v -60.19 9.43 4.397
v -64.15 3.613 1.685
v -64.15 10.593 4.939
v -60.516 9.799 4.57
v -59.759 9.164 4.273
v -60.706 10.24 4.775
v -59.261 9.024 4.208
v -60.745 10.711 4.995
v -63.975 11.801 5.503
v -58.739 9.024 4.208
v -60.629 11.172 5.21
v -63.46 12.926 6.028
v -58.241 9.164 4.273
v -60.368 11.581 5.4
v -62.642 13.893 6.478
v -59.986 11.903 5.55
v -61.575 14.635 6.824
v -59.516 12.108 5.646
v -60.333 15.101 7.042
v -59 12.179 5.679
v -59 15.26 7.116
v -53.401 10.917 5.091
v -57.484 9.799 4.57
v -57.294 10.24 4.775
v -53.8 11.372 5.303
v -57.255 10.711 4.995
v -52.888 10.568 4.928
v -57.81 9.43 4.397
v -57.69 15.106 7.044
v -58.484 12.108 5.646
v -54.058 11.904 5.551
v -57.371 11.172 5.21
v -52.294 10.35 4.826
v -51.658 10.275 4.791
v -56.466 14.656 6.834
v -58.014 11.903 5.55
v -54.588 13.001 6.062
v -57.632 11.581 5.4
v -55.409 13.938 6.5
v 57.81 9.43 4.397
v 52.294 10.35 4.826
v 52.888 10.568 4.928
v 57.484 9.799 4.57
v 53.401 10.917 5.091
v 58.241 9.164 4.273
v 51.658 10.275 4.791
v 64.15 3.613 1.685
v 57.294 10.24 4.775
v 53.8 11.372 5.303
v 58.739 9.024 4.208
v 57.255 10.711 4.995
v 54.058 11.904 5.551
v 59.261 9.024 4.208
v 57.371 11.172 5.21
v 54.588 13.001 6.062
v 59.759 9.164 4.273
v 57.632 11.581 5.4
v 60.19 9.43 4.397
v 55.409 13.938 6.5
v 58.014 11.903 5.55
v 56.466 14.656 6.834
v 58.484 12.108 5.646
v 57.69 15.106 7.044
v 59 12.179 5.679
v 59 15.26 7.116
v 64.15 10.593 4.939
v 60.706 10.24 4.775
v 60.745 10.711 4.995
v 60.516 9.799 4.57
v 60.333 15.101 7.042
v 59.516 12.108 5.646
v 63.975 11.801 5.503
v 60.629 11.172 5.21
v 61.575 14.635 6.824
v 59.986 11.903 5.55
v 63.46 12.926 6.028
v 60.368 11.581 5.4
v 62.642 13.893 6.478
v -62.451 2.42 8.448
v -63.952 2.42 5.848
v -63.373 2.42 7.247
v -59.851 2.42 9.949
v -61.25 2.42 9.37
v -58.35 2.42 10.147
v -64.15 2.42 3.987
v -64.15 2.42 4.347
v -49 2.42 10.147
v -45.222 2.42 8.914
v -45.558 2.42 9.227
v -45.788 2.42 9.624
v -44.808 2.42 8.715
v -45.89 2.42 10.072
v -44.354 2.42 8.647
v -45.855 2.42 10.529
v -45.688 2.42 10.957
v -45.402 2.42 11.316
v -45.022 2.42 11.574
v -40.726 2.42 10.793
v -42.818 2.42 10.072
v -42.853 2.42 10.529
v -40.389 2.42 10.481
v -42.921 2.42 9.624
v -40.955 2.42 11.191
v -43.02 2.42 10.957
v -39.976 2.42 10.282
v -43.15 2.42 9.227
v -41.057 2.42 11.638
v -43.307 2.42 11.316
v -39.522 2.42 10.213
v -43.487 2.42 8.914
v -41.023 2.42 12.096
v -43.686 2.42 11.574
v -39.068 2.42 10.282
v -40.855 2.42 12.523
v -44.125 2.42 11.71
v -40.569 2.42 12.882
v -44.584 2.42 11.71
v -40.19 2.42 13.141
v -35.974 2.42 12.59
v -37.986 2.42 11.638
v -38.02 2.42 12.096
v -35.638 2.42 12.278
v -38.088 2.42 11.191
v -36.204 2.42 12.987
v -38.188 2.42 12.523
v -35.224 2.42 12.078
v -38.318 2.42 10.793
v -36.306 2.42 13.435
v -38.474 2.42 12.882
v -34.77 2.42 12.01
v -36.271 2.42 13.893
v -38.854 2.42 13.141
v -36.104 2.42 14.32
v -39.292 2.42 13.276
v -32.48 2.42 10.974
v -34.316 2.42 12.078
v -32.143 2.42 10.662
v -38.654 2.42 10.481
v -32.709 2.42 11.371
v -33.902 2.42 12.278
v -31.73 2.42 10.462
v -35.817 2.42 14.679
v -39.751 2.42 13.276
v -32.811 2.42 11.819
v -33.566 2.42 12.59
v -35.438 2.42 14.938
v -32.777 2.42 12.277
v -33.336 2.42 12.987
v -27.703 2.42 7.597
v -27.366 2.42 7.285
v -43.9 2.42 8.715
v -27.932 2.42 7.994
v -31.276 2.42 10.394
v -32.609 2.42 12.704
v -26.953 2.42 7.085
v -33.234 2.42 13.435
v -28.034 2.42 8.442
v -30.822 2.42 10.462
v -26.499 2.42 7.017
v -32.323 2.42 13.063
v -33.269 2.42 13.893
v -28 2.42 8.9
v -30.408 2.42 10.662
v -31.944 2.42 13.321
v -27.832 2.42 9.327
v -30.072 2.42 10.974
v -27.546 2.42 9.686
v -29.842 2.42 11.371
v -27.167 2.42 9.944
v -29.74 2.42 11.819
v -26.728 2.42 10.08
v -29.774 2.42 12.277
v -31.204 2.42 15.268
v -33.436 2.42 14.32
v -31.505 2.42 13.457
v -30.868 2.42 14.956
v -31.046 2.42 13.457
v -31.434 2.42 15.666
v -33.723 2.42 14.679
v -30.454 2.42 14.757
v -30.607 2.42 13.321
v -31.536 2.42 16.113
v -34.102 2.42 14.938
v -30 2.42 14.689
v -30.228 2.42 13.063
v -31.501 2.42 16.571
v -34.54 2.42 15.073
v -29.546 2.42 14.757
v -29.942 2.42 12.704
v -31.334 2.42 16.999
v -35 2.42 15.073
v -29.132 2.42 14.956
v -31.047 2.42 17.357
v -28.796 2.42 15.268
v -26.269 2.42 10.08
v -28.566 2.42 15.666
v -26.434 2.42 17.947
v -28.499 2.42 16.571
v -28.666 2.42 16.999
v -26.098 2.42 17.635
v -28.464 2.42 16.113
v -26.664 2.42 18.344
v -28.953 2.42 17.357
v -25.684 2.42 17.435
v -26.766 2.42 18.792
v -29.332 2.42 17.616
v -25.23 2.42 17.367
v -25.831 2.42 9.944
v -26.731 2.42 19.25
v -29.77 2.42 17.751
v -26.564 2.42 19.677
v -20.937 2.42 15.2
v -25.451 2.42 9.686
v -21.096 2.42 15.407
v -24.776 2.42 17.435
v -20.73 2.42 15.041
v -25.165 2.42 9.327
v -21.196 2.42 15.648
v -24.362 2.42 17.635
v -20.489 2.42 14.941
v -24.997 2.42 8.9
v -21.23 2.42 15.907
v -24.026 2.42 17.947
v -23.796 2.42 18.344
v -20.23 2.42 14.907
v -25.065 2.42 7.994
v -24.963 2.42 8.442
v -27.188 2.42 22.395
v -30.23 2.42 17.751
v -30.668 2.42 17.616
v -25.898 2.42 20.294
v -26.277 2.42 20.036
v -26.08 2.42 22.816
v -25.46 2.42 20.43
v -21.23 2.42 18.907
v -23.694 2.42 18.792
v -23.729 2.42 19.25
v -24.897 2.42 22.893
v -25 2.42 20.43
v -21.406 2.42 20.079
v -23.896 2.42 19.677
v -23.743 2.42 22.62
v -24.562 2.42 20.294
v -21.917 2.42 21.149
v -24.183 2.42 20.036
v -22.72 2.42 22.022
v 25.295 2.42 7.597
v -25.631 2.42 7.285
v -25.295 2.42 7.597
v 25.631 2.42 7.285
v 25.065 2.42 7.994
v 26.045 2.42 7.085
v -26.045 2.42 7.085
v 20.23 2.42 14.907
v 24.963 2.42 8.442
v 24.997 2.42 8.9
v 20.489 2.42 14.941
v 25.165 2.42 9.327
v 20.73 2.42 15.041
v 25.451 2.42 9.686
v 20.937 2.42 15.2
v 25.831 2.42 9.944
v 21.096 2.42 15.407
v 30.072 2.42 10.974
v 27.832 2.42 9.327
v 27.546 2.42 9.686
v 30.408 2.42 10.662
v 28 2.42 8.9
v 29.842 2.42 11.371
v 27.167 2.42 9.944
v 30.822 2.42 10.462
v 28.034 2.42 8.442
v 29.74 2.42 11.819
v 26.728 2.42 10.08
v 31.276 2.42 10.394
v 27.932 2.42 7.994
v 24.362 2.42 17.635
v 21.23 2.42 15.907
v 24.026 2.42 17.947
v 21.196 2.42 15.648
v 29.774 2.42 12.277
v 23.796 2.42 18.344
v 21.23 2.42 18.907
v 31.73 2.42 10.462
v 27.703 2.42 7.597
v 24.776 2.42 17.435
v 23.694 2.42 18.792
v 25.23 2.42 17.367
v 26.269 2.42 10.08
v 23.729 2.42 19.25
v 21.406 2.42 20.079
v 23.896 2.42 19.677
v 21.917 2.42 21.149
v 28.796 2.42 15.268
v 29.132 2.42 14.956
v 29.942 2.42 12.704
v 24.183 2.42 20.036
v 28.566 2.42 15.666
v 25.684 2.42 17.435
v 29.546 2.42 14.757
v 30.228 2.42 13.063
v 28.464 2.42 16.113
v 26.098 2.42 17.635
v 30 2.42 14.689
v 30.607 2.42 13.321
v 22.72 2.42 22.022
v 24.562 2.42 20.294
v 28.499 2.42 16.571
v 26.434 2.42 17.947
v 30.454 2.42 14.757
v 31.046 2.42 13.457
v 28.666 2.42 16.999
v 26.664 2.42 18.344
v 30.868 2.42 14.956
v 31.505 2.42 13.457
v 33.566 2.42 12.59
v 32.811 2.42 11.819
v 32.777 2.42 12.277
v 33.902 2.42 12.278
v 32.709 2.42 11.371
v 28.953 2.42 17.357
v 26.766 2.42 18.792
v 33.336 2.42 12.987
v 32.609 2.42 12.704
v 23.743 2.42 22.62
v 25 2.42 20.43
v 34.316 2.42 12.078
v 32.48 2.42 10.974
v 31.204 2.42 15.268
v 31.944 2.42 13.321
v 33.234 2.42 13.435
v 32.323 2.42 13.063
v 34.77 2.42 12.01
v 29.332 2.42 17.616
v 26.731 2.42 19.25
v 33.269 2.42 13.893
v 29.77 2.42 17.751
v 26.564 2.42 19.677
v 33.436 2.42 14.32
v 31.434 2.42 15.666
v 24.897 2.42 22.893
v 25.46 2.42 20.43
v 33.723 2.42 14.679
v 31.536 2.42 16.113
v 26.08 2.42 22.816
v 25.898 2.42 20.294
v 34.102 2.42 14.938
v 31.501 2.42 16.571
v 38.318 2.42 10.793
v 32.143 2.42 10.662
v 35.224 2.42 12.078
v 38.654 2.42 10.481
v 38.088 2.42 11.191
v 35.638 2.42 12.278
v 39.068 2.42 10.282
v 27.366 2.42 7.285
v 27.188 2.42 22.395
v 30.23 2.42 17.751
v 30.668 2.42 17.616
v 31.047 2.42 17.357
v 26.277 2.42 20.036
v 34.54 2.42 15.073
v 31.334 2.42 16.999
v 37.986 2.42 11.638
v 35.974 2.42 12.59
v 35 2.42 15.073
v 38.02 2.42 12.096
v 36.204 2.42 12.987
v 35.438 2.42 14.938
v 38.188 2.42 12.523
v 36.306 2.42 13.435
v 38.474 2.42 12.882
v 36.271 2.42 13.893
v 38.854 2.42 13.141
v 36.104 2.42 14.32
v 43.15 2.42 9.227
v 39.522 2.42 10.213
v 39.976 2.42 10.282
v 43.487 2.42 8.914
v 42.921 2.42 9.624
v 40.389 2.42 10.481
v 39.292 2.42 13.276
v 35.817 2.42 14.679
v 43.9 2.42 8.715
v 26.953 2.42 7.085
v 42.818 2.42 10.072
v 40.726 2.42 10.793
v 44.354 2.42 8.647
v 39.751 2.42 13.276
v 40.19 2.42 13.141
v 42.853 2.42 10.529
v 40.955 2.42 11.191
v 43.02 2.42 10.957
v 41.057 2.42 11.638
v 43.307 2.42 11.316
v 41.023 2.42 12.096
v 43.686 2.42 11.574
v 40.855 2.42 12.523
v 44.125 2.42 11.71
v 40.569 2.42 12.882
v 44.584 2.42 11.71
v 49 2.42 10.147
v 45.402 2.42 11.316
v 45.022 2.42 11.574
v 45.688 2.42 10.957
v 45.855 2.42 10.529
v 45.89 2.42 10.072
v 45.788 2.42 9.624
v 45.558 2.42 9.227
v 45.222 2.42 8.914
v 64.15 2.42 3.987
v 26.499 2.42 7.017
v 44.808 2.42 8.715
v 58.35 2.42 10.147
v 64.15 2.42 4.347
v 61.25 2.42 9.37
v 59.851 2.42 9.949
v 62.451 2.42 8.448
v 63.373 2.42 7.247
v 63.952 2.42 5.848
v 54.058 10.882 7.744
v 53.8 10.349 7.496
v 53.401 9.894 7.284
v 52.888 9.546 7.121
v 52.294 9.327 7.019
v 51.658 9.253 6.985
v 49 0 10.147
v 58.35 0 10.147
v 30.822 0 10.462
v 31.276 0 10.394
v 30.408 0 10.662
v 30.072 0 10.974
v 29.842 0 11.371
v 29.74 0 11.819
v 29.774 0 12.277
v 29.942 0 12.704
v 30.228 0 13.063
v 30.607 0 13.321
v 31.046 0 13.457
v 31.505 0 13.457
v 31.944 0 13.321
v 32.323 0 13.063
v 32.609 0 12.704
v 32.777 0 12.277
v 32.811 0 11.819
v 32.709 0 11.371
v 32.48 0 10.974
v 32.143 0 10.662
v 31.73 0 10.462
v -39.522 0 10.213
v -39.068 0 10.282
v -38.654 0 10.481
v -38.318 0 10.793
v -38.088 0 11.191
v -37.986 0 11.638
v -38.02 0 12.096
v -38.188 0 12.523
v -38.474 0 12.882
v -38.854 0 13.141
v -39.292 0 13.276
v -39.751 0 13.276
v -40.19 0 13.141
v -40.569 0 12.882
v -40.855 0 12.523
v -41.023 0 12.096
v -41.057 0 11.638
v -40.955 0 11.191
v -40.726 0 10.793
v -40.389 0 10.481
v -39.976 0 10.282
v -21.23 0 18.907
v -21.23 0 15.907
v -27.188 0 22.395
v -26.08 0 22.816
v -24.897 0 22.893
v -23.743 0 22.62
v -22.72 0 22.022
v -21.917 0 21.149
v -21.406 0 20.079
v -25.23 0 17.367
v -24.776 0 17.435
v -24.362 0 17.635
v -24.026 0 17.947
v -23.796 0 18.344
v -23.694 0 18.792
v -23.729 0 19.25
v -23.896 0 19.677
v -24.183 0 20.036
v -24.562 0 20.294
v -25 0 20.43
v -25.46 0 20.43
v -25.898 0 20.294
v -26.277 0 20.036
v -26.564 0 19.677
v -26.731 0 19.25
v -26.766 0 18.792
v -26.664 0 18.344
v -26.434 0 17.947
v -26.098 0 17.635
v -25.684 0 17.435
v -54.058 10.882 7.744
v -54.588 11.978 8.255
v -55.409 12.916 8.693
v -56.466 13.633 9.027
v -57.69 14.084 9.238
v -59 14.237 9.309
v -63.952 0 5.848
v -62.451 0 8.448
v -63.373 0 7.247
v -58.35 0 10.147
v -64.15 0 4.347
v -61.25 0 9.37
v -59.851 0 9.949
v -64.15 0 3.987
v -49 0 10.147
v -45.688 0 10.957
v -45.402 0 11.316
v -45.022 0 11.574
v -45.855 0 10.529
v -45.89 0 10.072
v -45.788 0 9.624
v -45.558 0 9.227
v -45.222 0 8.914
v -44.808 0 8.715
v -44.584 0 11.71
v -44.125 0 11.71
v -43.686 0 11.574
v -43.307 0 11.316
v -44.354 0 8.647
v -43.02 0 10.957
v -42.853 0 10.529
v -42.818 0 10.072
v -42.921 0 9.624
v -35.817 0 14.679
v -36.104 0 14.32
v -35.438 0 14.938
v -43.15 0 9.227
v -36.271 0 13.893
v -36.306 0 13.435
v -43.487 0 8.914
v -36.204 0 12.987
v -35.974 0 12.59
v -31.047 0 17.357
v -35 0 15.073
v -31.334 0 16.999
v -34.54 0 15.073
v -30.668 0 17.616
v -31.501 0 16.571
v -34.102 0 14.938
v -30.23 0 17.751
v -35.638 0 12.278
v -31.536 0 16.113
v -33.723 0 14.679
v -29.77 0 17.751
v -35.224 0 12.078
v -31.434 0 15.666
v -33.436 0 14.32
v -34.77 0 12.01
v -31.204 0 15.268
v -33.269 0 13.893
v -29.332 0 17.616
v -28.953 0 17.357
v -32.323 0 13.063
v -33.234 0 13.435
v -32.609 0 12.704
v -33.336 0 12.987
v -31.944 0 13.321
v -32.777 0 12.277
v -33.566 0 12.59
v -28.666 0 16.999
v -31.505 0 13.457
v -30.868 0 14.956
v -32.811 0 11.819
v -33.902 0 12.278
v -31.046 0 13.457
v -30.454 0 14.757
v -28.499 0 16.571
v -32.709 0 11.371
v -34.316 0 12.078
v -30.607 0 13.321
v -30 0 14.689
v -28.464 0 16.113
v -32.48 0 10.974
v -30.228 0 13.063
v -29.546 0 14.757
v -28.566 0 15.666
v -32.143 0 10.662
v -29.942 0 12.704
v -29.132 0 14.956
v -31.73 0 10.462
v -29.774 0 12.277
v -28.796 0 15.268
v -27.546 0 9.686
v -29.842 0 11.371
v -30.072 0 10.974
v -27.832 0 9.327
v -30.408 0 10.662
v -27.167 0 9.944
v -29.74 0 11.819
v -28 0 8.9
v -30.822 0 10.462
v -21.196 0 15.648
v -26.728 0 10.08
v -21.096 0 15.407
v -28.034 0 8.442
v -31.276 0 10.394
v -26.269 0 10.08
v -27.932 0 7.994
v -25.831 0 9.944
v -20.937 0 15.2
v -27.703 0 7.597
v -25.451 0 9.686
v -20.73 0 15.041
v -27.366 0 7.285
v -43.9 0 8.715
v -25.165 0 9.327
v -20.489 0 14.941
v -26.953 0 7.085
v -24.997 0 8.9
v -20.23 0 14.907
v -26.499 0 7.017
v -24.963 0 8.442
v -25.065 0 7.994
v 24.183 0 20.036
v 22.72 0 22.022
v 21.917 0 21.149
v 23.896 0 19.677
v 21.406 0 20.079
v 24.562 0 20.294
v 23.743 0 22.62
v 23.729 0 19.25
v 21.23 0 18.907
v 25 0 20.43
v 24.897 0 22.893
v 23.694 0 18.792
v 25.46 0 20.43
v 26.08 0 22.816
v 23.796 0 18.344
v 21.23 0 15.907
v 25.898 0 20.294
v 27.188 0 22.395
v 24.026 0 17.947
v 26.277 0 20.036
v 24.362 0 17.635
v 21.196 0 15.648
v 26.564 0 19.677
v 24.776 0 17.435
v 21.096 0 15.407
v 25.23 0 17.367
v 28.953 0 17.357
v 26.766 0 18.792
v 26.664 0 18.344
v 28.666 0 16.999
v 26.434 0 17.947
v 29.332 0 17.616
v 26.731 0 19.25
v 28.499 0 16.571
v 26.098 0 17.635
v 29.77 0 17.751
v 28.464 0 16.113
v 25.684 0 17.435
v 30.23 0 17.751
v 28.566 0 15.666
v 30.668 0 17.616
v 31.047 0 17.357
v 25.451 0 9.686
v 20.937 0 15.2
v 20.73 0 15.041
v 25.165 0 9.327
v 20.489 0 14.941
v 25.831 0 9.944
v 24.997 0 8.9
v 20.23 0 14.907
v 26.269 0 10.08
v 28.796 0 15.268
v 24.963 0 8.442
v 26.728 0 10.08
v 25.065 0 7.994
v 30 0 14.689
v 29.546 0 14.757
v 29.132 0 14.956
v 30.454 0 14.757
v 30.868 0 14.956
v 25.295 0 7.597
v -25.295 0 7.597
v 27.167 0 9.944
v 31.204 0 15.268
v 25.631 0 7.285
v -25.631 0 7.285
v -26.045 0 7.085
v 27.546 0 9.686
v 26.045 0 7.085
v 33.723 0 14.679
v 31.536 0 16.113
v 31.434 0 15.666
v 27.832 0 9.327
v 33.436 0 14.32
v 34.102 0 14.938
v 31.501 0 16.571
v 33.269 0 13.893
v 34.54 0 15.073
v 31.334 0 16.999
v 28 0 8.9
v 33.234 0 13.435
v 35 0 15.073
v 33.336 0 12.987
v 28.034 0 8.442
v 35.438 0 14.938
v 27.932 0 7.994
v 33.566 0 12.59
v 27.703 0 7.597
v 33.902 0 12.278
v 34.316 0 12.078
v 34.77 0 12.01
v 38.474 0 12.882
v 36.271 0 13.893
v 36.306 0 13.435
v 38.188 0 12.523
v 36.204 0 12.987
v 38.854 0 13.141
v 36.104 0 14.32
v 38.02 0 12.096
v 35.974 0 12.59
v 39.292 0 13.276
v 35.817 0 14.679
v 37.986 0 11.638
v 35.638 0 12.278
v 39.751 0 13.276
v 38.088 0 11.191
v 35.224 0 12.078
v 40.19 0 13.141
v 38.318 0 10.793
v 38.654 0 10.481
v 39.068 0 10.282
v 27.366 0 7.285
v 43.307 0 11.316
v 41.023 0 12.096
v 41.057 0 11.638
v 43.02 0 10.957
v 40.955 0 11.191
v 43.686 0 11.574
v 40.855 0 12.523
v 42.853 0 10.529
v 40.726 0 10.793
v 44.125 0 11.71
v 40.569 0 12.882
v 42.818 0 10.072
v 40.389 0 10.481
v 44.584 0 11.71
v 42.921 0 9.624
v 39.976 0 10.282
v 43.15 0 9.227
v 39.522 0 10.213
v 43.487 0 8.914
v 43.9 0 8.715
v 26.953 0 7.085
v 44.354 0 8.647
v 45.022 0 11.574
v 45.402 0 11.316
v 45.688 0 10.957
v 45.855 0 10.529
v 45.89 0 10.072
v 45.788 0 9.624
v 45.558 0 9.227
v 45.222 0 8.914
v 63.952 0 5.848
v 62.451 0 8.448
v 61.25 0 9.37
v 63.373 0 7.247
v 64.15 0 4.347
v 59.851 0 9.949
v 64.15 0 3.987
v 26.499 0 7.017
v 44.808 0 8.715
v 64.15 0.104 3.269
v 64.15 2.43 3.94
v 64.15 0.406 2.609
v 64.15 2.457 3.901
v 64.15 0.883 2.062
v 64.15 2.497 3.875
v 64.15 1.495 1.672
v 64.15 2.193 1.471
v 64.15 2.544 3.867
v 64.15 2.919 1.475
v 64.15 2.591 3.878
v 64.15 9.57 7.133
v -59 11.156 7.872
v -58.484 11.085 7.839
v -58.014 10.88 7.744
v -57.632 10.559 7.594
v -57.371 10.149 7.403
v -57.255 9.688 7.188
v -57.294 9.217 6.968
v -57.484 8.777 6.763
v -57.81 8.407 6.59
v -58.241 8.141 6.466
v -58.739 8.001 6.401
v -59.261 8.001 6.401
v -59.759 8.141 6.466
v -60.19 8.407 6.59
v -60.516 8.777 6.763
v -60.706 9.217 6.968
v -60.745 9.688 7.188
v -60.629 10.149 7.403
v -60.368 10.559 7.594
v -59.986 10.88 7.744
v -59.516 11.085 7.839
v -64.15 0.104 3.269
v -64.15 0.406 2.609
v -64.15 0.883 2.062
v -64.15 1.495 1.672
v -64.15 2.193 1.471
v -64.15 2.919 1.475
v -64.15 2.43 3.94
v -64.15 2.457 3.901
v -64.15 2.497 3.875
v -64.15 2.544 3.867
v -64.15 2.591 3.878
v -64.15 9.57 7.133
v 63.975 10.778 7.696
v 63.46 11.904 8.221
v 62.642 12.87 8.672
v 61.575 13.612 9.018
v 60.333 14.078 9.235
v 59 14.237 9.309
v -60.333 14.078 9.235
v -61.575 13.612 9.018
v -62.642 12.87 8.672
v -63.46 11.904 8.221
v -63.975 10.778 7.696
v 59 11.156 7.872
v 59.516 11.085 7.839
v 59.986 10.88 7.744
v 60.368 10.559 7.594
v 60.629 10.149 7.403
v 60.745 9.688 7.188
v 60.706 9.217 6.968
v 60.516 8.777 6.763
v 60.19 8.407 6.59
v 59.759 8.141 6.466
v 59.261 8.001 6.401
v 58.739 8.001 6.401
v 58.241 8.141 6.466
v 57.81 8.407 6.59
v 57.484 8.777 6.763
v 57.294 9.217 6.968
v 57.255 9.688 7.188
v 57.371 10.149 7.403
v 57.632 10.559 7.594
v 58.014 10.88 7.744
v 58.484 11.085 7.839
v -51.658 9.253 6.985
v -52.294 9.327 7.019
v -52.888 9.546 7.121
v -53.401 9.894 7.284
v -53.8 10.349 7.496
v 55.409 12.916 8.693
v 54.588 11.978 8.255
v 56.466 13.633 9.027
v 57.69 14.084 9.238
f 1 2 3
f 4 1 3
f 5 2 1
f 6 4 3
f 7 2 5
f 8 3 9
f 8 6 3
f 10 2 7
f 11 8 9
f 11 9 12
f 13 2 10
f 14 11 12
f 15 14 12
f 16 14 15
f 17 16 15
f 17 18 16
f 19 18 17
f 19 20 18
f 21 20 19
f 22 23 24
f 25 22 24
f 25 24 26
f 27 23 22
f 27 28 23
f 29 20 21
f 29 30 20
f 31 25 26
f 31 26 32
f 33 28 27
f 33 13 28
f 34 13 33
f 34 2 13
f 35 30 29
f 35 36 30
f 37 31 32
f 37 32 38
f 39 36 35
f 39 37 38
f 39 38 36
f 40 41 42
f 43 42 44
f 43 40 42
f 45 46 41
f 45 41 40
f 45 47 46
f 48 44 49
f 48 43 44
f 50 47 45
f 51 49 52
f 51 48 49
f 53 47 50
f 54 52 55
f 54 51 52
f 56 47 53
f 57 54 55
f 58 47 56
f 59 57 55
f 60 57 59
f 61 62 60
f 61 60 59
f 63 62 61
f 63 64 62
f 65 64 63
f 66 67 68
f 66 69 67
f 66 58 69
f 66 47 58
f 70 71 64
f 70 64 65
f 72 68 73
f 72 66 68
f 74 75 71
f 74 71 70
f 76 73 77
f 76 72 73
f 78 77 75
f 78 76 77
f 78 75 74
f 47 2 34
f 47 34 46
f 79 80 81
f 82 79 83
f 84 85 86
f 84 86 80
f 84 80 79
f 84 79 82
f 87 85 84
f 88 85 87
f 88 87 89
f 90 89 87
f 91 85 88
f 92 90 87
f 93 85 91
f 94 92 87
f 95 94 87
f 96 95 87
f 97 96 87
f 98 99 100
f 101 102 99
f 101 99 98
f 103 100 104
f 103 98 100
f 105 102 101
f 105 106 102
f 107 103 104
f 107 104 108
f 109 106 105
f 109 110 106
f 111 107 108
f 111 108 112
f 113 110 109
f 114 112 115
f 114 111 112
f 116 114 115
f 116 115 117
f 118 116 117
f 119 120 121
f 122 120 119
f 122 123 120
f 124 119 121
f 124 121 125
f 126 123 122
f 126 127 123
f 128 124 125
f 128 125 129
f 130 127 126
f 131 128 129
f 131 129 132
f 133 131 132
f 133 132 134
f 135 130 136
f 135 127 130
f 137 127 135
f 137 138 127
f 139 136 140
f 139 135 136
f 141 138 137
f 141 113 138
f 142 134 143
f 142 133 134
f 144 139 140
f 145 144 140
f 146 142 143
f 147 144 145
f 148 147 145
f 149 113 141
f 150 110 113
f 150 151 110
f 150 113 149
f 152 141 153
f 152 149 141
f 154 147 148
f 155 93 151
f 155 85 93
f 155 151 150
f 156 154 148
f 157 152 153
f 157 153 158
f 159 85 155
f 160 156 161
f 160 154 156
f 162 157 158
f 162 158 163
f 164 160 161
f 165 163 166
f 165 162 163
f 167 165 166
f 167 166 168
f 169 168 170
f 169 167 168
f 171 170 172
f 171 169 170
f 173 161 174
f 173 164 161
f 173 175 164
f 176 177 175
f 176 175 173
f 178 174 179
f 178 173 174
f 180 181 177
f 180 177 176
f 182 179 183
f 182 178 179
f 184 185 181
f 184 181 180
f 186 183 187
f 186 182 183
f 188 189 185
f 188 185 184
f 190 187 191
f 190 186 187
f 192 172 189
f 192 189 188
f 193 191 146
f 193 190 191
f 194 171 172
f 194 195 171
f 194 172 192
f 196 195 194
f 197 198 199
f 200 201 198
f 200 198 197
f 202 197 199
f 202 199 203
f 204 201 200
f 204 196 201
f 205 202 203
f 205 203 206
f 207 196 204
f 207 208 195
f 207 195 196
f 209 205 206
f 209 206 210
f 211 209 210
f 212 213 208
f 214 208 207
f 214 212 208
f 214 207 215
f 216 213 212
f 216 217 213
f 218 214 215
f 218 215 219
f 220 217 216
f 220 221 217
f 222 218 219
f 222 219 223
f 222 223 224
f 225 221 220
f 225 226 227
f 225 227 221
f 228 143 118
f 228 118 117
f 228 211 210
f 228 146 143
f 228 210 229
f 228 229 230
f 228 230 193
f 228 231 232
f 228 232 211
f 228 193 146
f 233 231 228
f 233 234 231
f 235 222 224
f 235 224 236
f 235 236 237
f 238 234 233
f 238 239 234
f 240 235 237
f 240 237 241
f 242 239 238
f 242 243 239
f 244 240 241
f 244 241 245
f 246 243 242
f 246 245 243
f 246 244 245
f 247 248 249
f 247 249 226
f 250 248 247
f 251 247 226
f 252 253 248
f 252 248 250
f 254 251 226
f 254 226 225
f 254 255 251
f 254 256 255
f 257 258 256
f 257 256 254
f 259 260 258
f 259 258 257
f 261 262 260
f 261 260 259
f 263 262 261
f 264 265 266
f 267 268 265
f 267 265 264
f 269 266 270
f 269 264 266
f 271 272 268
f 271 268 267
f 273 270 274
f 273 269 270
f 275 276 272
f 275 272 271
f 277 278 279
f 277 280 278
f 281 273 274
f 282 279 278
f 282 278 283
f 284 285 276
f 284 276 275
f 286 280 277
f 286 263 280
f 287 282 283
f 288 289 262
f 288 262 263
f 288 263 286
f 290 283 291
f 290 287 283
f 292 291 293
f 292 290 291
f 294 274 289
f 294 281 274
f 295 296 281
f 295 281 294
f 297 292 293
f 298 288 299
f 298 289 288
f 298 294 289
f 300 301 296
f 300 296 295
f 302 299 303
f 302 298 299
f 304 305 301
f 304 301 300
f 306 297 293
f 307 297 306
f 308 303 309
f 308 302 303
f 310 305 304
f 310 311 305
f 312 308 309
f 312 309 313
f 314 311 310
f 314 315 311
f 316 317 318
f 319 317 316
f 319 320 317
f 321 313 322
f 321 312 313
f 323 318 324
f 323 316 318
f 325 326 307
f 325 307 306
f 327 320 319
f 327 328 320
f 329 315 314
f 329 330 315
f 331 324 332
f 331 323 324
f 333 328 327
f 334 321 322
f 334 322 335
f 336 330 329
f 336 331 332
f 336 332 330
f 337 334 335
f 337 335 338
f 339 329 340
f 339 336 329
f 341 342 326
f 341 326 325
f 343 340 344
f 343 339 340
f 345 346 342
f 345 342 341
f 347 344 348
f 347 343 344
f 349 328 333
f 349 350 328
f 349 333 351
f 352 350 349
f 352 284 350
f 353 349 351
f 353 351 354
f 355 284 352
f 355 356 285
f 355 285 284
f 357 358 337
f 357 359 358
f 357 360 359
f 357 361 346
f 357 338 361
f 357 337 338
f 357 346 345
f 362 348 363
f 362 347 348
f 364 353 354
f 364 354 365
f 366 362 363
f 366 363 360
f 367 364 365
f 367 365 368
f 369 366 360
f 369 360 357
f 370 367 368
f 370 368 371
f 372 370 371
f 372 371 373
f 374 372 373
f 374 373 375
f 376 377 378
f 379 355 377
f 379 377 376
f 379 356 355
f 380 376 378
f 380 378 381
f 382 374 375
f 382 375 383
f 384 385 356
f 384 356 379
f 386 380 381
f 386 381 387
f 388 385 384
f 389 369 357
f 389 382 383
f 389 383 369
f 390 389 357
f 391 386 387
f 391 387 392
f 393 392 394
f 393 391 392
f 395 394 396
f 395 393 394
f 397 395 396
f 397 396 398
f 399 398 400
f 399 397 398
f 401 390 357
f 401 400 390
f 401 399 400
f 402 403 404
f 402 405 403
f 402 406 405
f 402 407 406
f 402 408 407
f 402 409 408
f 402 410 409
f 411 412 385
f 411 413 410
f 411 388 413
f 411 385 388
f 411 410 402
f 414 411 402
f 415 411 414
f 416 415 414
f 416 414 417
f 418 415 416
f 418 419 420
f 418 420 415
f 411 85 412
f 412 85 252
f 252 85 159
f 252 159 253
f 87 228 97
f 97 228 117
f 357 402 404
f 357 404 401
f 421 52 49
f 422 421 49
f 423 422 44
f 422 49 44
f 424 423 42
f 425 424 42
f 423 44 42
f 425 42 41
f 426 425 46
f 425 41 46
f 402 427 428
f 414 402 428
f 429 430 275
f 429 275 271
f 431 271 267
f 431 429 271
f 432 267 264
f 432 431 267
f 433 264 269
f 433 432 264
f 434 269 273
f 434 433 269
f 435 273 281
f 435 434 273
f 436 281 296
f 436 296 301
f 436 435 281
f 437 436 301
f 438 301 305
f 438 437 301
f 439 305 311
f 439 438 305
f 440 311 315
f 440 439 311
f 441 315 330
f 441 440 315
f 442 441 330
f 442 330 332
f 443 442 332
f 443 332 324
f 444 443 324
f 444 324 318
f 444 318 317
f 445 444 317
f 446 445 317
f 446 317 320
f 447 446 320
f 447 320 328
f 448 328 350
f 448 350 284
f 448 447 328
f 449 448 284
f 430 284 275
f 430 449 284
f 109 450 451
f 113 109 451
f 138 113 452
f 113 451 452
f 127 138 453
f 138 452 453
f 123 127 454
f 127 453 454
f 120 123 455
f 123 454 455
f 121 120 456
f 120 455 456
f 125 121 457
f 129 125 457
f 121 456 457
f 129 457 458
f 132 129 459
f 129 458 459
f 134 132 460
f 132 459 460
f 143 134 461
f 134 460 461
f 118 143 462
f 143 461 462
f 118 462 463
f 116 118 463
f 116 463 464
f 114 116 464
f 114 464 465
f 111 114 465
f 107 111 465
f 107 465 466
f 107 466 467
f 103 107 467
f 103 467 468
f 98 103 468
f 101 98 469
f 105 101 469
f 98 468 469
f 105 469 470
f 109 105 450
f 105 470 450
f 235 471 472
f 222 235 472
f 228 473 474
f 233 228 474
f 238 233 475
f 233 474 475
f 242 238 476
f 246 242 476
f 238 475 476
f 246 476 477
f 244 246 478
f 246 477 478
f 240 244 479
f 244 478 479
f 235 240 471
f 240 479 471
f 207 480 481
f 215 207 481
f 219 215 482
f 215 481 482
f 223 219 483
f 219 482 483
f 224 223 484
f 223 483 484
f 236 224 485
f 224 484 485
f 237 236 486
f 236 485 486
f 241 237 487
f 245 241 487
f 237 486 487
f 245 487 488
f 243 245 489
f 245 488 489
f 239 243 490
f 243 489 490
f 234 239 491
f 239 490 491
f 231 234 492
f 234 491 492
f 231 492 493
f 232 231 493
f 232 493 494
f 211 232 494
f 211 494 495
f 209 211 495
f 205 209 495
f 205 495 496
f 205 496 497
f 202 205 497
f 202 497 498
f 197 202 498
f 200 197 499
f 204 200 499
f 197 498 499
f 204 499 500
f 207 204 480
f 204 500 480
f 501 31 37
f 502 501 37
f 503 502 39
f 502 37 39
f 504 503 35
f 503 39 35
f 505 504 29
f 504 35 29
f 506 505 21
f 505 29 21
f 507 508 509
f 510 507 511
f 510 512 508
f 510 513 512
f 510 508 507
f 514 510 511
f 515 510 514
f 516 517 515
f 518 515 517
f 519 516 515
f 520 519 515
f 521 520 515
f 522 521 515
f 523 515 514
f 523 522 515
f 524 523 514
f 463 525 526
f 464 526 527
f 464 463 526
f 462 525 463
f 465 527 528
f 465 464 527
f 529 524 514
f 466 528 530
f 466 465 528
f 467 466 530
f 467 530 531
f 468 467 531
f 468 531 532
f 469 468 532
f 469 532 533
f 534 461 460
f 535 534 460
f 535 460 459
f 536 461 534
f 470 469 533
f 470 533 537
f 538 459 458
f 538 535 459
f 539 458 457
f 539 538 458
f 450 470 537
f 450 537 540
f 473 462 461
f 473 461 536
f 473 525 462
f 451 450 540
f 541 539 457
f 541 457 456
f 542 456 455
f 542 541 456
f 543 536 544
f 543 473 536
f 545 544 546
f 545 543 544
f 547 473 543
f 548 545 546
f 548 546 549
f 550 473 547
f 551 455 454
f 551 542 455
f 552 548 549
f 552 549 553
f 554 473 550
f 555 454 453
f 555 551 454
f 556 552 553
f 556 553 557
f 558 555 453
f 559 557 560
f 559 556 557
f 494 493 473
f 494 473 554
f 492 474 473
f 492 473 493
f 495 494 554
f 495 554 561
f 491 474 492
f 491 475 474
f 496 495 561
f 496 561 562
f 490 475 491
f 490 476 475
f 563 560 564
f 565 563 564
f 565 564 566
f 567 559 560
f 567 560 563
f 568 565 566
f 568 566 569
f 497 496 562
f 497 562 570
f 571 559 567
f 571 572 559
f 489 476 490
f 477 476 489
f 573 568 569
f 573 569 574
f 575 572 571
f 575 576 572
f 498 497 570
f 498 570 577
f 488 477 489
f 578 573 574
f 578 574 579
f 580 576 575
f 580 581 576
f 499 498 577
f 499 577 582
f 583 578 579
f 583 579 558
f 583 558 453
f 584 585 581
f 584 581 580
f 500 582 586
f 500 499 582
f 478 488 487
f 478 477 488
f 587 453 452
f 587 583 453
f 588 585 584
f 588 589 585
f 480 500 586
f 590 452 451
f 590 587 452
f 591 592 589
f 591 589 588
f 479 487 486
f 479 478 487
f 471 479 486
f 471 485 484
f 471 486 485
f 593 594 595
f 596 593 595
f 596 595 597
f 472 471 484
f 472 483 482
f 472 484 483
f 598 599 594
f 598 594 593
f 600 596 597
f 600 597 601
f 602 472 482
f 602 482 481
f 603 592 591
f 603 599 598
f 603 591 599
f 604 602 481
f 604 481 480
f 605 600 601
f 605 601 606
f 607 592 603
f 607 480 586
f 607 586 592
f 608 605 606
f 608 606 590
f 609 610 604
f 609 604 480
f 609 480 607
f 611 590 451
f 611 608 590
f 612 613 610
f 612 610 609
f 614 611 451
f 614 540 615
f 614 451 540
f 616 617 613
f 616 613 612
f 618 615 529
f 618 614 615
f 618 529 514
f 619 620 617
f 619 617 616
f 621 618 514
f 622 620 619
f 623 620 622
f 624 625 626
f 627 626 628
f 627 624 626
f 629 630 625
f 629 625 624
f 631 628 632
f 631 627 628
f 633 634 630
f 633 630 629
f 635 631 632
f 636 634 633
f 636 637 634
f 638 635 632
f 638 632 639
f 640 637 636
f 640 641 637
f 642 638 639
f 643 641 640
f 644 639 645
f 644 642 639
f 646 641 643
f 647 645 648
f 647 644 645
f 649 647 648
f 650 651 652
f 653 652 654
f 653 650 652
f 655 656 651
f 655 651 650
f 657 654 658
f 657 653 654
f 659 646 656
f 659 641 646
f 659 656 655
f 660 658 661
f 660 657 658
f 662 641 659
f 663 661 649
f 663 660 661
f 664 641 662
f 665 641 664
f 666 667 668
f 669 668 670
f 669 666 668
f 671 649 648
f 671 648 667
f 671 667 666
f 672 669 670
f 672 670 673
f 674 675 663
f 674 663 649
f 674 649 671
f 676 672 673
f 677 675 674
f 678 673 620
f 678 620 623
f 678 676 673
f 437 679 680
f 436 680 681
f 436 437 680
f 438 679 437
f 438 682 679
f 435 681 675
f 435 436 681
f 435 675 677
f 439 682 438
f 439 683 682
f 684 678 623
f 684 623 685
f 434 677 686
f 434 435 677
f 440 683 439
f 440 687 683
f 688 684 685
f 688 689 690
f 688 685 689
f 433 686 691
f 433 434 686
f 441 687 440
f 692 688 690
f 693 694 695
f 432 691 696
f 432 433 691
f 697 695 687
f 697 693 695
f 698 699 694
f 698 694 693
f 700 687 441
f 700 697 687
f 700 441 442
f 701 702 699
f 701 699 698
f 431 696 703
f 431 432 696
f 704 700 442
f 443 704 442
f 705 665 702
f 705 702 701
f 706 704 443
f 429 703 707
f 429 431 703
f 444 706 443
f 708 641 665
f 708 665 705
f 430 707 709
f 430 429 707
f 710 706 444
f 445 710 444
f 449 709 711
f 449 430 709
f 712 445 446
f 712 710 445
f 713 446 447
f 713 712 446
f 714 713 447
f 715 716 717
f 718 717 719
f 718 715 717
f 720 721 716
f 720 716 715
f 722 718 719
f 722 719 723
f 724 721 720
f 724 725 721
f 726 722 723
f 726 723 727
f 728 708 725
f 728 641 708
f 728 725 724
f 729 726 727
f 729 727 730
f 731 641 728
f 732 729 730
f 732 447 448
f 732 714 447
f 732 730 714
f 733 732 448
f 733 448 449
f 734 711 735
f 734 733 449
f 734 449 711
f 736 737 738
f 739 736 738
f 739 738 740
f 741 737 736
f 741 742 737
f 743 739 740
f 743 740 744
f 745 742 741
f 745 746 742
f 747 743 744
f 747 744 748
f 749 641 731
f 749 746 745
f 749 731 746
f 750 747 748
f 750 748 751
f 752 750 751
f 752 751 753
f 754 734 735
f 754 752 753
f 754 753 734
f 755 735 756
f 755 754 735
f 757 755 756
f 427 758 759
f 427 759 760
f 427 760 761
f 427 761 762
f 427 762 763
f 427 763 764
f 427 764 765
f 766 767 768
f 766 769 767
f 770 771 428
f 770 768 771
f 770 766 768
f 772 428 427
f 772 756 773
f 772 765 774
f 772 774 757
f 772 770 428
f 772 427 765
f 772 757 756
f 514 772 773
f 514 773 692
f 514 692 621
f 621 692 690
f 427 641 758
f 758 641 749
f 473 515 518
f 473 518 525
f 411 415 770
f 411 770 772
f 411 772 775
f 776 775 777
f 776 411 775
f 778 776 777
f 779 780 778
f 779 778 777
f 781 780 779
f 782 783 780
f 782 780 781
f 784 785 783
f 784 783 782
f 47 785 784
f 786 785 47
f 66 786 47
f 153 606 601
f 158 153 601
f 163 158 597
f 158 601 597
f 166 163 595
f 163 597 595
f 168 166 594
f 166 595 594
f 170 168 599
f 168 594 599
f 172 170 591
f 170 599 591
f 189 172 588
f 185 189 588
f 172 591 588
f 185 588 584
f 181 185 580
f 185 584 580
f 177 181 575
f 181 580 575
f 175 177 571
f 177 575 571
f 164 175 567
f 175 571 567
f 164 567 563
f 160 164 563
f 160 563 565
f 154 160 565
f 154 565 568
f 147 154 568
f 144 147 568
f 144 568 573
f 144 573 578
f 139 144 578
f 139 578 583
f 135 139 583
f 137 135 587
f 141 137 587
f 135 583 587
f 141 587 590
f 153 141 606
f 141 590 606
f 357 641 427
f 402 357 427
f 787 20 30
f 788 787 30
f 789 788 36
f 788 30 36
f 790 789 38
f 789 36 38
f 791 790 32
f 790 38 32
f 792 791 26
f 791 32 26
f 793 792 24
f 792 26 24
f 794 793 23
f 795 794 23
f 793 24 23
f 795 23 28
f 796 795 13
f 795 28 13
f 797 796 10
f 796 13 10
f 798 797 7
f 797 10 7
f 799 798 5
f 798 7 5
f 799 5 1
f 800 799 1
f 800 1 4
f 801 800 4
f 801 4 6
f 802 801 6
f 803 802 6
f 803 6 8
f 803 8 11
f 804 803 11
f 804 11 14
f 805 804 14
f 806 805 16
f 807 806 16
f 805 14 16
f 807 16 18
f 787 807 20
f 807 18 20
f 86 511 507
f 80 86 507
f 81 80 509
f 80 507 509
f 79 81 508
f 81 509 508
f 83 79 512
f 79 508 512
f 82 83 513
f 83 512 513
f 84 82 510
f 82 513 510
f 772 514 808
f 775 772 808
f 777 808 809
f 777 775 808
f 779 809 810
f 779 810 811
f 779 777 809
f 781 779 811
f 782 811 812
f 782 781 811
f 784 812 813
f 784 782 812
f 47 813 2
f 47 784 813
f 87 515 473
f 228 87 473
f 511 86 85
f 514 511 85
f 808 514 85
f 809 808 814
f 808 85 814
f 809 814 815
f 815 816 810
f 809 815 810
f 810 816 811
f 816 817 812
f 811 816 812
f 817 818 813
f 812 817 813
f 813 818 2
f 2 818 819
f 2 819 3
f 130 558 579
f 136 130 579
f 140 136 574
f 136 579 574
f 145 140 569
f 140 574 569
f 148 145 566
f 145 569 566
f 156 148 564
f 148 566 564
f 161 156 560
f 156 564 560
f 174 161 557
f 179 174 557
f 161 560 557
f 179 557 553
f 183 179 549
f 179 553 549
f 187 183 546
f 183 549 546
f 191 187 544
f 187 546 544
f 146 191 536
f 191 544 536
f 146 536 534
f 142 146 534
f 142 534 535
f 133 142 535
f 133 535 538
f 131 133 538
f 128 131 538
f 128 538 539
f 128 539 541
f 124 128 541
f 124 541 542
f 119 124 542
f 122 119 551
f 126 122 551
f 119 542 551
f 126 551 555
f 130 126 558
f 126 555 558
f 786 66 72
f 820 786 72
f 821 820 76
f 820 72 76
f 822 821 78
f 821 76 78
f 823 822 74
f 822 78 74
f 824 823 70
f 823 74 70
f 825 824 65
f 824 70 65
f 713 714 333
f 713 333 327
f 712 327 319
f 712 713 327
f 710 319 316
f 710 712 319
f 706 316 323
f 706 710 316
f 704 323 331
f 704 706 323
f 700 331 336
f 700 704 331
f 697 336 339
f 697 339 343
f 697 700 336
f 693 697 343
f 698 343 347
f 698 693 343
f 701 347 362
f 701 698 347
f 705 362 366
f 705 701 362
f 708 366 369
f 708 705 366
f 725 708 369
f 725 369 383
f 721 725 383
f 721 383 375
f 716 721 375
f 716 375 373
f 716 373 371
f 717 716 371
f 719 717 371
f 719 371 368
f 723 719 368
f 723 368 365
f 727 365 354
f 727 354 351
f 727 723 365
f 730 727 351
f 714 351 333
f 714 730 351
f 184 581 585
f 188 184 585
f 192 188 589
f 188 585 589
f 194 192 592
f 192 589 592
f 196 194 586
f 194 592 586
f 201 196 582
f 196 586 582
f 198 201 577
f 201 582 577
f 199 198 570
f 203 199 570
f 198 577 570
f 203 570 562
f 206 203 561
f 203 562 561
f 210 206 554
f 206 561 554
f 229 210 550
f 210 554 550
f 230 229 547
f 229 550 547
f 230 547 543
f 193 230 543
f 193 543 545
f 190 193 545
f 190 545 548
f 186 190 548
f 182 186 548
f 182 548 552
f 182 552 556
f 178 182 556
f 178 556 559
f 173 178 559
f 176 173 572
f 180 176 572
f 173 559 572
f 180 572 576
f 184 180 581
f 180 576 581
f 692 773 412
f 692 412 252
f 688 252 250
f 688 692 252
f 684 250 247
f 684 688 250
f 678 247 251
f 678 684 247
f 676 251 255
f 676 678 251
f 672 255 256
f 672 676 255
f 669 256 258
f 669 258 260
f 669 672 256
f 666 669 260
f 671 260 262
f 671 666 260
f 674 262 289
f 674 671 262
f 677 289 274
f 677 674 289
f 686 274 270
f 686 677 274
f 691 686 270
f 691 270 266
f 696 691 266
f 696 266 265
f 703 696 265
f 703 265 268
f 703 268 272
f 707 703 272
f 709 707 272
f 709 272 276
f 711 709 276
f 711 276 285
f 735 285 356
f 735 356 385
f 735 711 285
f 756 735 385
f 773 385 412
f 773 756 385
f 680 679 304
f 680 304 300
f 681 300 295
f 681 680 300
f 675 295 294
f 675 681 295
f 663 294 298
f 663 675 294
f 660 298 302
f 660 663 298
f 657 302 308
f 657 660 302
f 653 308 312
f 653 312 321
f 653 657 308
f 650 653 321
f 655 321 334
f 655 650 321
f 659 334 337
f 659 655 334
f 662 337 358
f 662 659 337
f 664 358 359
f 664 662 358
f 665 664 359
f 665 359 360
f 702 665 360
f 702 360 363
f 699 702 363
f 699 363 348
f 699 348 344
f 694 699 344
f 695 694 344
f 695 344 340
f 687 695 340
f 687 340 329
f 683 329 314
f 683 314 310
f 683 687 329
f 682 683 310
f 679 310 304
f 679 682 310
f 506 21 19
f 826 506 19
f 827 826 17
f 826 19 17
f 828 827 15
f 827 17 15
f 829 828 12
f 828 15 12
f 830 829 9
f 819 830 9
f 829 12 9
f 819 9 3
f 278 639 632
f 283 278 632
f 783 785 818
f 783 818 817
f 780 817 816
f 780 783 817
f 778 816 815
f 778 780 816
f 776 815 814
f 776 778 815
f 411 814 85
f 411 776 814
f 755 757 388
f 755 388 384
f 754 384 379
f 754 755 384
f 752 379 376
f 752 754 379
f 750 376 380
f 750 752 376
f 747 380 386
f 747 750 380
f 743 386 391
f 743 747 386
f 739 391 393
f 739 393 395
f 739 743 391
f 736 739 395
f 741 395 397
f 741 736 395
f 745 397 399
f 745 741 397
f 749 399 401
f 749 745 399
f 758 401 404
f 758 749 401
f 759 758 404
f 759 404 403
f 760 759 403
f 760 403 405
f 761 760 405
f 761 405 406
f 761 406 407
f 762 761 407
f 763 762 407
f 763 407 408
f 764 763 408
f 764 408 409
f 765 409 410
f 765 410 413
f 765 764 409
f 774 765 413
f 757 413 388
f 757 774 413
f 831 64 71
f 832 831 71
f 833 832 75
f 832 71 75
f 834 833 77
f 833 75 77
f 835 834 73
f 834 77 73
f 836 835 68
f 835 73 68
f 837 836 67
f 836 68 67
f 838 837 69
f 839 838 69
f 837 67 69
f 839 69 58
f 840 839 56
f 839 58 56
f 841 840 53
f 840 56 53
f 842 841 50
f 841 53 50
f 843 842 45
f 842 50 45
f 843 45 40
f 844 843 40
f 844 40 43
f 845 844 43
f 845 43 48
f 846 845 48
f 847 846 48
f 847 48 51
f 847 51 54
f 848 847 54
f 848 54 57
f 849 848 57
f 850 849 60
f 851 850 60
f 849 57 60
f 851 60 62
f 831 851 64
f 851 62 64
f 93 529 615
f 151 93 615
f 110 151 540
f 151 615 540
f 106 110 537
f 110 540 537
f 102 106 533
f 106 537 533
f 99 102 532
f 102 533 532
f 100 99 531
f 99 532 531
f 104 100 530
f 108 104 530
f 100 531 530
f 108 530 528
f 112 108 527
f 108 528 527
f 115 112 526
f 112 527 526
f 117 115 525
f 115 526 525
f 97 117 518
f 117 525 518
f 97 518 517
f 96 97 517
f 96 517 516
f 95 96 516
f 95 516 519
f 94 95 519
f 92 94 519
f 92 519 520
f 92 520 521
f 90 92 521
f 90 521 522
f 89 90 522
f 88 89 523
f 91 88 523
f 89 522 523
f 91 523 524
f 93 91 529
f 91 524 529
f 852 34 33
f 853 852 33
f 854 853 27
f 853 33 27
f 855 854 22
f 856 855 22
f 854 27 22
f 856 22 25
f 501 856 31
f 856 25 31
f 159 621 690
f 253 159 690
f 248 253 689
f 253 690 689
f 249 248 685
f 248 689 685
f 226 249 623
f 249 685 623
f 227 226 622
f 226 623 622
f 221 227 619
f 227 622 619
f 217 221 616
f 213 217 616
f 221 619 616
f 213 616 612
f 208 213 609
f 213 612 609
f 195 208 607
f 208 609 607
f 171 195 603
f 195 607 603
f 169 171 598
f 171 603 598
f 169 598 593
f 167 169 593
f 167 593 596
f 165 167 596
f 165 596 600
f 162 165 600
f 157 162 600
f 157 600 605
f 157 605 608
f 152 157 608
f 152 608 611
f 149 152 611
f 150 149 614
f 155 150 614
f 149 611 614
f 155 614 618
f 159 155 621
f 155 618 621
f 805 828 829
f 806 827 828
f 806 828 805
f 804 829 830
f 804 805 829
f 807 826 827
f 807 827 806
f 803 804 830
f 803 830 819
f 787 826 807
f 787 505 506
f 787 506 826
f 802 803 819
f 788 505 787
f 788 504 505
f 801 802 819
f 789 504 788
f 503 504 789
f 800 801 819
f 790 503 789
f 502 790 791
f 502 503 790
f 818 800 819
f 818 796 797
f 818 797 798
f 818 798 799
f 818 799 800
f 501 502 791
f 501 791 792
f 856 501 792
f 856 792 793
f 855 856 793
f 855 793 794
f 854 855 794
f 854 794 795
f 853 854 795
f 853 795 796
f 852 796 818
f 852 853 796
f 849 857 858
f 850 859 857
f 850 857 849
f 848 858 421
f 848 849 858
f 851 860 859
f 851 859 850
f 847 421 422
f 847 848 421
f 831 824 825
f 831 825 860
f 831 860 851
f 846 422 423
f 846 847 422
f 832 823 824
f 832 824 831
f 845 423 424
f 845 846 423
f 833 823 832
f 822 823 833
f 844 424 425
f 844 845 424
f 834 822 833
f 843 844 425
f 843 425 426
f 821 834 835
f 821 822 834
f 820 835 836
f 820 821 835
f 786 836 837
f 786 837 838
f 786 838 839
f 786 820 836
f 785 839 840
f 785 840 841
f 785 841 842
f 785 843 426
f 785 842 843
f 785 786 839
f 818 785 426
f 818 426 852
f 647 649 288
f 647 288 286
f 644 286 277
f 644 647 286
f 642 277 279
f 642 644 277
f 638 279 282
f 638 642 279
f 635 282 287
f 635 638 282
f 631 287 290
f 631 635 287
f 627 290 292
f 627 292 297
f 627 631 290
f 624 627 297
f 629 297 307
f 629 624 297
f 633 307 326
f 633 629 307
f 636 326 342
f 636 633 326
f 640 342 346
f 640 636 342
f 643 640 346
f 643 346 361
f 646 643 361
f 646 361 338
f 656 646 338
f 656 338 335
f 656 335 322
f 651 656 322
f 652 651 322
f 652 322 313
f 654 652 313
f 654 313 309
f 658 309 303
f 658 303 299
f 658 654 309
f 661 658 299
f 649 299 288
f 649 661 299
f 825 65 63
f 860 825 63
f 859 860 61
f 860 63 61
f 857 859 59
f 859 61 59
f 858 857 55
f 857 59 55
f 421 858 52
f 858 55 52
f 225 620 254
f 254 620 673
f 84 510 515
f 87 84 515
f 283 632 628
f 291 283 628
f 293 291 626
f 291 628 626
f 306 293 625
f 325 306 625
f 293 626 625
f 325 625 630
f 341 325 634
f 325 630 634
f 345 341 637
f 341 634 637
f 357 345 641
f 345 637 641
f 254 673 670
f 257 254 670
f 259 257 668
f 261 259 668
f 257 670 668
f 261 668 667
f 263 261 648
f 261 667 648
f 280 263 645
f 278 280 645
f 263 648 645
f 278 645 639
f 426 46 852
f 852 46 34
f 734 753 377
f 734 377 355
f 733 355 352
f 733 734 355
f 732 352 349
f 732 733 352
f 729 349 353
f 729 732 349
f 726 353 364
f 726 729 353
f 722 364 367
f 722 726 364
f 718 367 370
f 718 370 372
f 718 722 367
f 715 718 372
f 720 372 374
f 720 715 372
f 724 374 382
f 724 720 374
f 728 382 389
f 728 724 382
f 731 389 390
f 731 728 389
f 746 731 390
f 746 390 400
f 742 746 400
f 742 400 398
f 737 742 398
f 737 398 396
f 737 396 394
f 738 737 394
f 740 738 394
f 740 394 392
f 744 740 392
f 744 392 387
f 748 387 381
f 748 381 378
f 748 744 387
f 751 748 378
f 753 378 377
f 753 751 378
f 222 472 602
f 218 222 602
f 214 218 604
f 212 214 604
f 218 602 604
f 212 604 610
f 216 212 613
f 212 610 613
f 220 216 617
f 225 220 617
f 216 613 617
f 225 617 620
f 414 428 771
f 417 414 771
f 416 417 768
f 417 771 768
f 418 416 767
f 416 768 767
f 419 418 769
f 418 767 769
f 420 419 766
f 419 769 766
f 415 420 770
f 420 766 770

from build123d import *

# Parameters (mm, degrees)
BOSS_EXTRUDE1_DEPTH = 64.15
SKETCH2_R           = 1.75
CUT_EXTRUDE1_DEPTH  = 2.42
CUT_EXTRUDE2_DEPTH  = 2.42
SKETCH4_R           = 1.54
CUT_EXTRUDE3_DEPTH  = 2.42


with BuildPart() as part:
    # Sketch1 → Boss-Extrude1 (new, symmetric)
    with BuildSketch(Plane(origin=(0, 0, 0), x_dir=(0, 0, -1), z_dir=(1, 0, 0))):
        with BuildLine():
            Line((-22.947001366, 0), (-3.987001366, 0))
            ThreePointArc((-3.987001366, 0), (-1.844787094, 1.175258995), (-1.684979587, 3.613450385))
            Line((-1.684979587, 3.613450385), (-7.115854863, 15.26))
            Line((-7.115854863, 15.26), (-9.309119708, 14.237263807))
            Line((-9.309119708, 14.237263807), (-3.878244431, 2.590714191))
            ThreePointArc((-3.878244431, 2.590714191), (-3.885794392, 2.475524047), (-3.987001366, 2.42))
            Line((-3.987001366, 2.42), (-22.947001366, 2.42))
            Line((-22.947001366, 2.42), (-22.947001366, 0))
        make_face()
    extrude(amount=BOSS_EXTRUDE1_DEPTH, both=True)

    # Sketch2 → Cut-Extrude1 (cut)
    with BuildSketch(Plane(origin=(0, 0, 0), x_dir=(-1, 0, 0), z_dir=(0, 0.4226182617407038, -0.9063077870366478))):
        with BuildLine():
            ThreePointArc((-64.15, 11.687547043), (-62.641599916, 15.329146974), (-58.999999979, 16.837547043))
            Line((-58.999999979, 16.837547043), (-64.15, 16.837547043))
            Line((-64.15, 16.837547043), (-64.15, 11.687547043))
        make_face()
        with BuildLine():
            ThreePointArc((54.05757399, 13.134932664), (55.912244813, 15.809229698), (58.999999973, 16.837547043))
            Line((58.999999973, 16.837547043), (-58.999999979, 16.837547043))
            ThreePointArc((-58.999999979, 16.837547043), (-55.912244816, 15.8092297), (-54.05757399, 13.134932664))
            ThreePointArc((-54.05757399, 13.134932664), (-53.157248342, 11.836730217), (-51.658338063, 11.337547043))
            Line((-51.658338063, 11.337547043), (51.658338063, 11.337547043))
            ThreePointArc((51.658338063, 11.337547043), (53.157248342, 11.836730217), (54.05757399, 13.134932664))
        make_face()
        with BuildLine():
            ThreePointArc((58.999999973, 16.837547043), (62.641599913, 15.329146976), (64.15, 11.687547043))
            Line((64.15, 11.687547043), (64.15, 16.837547043))
            Line((64.15, 16.837547043), (58.999999973, 16.837547043))
        make_face()
        with Locations(Location((-59, 11.687547043, 0), (0, 0, 90))):
            Circle(SKETCH2_R)
        with Locations(Location((59, 11.687547043, 0), (0, 0, 90))):
            Circle(SKETCH2_R)
    extrude(amount=-CUT_EXTRUDE1_DEPTH, mode=Mode.SUBTRACT)

    # Sketch3 → Cut-Extrude2 (cut)
    with BuildSketch(Plane.XZ):
        with BuildLine():
            ThreePointArc((-64.15, 4.347001366), (-62.451219331, 8.448220697), (-58.35, 10.147001366))
            Line((-58.35, 10.147001366), (-49, 10.147001366))
            Line((-49, 10.147001366), (-27.188464844, 22.394753573))
            ThreePointArc((-27.188464844, 22.394753573), (-23.20933914, 22.359091991), (-21.23, 18.907001366))
            Line((-21.23, 18.907001366), (-21.23, 15.907001366))
            ThreePointArc((-21.23, 15.907001366), (-20.937106781, 15.199894585), (-20.23, 14.907001366))
            Line((-20.23, 14.907001366), (20.23, 14.907001366))
            ThreePointArc((20.23, 14.907001366), (20.937106781, 15.199894585), (21.23, 15.907001366))
            Line((21.23, 15.907001366), (21.23, 18.907001366))
            ThreePointArc((21.23, 18.907001366), (23.20933914, 22.359091991), (27.188464844, 22.394753573))
            Line((27.188464844, 22.394753573), (49, 10.147001366))
            Line((49, 10.147001366), (58.35, 10.147001366))
            ThreePointArc((58.35, 10.147001366), (62.451219331, 8.448220697), (64.15, 4.347001366))
            Line((64.15, 4.347001366), (64.15, 22.947001366))
            Line((64.15, 22.947001366), (-64.15, 22.947001366))
            Line((-64.15, 22.947001366), (-64.15, 4.347001366))
        make_face()
    extrude(amount=-CUT_EXTRUDE2_DEPTH, mode=Mode.SUBTRACT)

    # Sketch4 → Cut-Extrude3 (cut)
    with BuildSketch(Plane.XZ):
        with Locations(Location((-25.23, 18.907001366, 0), (0, 0, 270))):
            Circle(SKETCH4_R)
        with Locations(Location((-30, 16.228520571, 0), (0, 0, 270))):
            Circle(SKETCH4_R)
        with Locations(Location((-34.77, 13.550039776, 0), (0, 0, 270))):
            Circle(SKETCH4_R)
        with Locations(Location((-31.275605409, 11.933962289, 0), (0, 0, 270))):
            Circle(SKETCH4_R)
        with Locations(Location((-39.521703084, 11.753454736, 0), (0, 0, 270))):
            Circle(SKETCH4_R)
        with Locations(Location((-44.354096024, 10.186809126, 0), (0, 0, 270))):
            Circle(SKETCH4_R)
        with Locations(Location((-26.498719925, 8.557001366, 0), (0, 0, 270))):
            Circle(SKETCH4_R)
    cut_extrude3 = extrude(amount=-CUT_EXTRUDE3_DEPTH, mode=Mode.SUBTRACT)

    # Mirror1: Cut-Extrude3 across plane
    add(cut_extrude3.mirror(Plane(origin=(0, 0, 0), x_dir=(0, 0, 1), z_dir=(1, 0, 0))), mode=Mode.SUBTRACT)


solid = part.part
